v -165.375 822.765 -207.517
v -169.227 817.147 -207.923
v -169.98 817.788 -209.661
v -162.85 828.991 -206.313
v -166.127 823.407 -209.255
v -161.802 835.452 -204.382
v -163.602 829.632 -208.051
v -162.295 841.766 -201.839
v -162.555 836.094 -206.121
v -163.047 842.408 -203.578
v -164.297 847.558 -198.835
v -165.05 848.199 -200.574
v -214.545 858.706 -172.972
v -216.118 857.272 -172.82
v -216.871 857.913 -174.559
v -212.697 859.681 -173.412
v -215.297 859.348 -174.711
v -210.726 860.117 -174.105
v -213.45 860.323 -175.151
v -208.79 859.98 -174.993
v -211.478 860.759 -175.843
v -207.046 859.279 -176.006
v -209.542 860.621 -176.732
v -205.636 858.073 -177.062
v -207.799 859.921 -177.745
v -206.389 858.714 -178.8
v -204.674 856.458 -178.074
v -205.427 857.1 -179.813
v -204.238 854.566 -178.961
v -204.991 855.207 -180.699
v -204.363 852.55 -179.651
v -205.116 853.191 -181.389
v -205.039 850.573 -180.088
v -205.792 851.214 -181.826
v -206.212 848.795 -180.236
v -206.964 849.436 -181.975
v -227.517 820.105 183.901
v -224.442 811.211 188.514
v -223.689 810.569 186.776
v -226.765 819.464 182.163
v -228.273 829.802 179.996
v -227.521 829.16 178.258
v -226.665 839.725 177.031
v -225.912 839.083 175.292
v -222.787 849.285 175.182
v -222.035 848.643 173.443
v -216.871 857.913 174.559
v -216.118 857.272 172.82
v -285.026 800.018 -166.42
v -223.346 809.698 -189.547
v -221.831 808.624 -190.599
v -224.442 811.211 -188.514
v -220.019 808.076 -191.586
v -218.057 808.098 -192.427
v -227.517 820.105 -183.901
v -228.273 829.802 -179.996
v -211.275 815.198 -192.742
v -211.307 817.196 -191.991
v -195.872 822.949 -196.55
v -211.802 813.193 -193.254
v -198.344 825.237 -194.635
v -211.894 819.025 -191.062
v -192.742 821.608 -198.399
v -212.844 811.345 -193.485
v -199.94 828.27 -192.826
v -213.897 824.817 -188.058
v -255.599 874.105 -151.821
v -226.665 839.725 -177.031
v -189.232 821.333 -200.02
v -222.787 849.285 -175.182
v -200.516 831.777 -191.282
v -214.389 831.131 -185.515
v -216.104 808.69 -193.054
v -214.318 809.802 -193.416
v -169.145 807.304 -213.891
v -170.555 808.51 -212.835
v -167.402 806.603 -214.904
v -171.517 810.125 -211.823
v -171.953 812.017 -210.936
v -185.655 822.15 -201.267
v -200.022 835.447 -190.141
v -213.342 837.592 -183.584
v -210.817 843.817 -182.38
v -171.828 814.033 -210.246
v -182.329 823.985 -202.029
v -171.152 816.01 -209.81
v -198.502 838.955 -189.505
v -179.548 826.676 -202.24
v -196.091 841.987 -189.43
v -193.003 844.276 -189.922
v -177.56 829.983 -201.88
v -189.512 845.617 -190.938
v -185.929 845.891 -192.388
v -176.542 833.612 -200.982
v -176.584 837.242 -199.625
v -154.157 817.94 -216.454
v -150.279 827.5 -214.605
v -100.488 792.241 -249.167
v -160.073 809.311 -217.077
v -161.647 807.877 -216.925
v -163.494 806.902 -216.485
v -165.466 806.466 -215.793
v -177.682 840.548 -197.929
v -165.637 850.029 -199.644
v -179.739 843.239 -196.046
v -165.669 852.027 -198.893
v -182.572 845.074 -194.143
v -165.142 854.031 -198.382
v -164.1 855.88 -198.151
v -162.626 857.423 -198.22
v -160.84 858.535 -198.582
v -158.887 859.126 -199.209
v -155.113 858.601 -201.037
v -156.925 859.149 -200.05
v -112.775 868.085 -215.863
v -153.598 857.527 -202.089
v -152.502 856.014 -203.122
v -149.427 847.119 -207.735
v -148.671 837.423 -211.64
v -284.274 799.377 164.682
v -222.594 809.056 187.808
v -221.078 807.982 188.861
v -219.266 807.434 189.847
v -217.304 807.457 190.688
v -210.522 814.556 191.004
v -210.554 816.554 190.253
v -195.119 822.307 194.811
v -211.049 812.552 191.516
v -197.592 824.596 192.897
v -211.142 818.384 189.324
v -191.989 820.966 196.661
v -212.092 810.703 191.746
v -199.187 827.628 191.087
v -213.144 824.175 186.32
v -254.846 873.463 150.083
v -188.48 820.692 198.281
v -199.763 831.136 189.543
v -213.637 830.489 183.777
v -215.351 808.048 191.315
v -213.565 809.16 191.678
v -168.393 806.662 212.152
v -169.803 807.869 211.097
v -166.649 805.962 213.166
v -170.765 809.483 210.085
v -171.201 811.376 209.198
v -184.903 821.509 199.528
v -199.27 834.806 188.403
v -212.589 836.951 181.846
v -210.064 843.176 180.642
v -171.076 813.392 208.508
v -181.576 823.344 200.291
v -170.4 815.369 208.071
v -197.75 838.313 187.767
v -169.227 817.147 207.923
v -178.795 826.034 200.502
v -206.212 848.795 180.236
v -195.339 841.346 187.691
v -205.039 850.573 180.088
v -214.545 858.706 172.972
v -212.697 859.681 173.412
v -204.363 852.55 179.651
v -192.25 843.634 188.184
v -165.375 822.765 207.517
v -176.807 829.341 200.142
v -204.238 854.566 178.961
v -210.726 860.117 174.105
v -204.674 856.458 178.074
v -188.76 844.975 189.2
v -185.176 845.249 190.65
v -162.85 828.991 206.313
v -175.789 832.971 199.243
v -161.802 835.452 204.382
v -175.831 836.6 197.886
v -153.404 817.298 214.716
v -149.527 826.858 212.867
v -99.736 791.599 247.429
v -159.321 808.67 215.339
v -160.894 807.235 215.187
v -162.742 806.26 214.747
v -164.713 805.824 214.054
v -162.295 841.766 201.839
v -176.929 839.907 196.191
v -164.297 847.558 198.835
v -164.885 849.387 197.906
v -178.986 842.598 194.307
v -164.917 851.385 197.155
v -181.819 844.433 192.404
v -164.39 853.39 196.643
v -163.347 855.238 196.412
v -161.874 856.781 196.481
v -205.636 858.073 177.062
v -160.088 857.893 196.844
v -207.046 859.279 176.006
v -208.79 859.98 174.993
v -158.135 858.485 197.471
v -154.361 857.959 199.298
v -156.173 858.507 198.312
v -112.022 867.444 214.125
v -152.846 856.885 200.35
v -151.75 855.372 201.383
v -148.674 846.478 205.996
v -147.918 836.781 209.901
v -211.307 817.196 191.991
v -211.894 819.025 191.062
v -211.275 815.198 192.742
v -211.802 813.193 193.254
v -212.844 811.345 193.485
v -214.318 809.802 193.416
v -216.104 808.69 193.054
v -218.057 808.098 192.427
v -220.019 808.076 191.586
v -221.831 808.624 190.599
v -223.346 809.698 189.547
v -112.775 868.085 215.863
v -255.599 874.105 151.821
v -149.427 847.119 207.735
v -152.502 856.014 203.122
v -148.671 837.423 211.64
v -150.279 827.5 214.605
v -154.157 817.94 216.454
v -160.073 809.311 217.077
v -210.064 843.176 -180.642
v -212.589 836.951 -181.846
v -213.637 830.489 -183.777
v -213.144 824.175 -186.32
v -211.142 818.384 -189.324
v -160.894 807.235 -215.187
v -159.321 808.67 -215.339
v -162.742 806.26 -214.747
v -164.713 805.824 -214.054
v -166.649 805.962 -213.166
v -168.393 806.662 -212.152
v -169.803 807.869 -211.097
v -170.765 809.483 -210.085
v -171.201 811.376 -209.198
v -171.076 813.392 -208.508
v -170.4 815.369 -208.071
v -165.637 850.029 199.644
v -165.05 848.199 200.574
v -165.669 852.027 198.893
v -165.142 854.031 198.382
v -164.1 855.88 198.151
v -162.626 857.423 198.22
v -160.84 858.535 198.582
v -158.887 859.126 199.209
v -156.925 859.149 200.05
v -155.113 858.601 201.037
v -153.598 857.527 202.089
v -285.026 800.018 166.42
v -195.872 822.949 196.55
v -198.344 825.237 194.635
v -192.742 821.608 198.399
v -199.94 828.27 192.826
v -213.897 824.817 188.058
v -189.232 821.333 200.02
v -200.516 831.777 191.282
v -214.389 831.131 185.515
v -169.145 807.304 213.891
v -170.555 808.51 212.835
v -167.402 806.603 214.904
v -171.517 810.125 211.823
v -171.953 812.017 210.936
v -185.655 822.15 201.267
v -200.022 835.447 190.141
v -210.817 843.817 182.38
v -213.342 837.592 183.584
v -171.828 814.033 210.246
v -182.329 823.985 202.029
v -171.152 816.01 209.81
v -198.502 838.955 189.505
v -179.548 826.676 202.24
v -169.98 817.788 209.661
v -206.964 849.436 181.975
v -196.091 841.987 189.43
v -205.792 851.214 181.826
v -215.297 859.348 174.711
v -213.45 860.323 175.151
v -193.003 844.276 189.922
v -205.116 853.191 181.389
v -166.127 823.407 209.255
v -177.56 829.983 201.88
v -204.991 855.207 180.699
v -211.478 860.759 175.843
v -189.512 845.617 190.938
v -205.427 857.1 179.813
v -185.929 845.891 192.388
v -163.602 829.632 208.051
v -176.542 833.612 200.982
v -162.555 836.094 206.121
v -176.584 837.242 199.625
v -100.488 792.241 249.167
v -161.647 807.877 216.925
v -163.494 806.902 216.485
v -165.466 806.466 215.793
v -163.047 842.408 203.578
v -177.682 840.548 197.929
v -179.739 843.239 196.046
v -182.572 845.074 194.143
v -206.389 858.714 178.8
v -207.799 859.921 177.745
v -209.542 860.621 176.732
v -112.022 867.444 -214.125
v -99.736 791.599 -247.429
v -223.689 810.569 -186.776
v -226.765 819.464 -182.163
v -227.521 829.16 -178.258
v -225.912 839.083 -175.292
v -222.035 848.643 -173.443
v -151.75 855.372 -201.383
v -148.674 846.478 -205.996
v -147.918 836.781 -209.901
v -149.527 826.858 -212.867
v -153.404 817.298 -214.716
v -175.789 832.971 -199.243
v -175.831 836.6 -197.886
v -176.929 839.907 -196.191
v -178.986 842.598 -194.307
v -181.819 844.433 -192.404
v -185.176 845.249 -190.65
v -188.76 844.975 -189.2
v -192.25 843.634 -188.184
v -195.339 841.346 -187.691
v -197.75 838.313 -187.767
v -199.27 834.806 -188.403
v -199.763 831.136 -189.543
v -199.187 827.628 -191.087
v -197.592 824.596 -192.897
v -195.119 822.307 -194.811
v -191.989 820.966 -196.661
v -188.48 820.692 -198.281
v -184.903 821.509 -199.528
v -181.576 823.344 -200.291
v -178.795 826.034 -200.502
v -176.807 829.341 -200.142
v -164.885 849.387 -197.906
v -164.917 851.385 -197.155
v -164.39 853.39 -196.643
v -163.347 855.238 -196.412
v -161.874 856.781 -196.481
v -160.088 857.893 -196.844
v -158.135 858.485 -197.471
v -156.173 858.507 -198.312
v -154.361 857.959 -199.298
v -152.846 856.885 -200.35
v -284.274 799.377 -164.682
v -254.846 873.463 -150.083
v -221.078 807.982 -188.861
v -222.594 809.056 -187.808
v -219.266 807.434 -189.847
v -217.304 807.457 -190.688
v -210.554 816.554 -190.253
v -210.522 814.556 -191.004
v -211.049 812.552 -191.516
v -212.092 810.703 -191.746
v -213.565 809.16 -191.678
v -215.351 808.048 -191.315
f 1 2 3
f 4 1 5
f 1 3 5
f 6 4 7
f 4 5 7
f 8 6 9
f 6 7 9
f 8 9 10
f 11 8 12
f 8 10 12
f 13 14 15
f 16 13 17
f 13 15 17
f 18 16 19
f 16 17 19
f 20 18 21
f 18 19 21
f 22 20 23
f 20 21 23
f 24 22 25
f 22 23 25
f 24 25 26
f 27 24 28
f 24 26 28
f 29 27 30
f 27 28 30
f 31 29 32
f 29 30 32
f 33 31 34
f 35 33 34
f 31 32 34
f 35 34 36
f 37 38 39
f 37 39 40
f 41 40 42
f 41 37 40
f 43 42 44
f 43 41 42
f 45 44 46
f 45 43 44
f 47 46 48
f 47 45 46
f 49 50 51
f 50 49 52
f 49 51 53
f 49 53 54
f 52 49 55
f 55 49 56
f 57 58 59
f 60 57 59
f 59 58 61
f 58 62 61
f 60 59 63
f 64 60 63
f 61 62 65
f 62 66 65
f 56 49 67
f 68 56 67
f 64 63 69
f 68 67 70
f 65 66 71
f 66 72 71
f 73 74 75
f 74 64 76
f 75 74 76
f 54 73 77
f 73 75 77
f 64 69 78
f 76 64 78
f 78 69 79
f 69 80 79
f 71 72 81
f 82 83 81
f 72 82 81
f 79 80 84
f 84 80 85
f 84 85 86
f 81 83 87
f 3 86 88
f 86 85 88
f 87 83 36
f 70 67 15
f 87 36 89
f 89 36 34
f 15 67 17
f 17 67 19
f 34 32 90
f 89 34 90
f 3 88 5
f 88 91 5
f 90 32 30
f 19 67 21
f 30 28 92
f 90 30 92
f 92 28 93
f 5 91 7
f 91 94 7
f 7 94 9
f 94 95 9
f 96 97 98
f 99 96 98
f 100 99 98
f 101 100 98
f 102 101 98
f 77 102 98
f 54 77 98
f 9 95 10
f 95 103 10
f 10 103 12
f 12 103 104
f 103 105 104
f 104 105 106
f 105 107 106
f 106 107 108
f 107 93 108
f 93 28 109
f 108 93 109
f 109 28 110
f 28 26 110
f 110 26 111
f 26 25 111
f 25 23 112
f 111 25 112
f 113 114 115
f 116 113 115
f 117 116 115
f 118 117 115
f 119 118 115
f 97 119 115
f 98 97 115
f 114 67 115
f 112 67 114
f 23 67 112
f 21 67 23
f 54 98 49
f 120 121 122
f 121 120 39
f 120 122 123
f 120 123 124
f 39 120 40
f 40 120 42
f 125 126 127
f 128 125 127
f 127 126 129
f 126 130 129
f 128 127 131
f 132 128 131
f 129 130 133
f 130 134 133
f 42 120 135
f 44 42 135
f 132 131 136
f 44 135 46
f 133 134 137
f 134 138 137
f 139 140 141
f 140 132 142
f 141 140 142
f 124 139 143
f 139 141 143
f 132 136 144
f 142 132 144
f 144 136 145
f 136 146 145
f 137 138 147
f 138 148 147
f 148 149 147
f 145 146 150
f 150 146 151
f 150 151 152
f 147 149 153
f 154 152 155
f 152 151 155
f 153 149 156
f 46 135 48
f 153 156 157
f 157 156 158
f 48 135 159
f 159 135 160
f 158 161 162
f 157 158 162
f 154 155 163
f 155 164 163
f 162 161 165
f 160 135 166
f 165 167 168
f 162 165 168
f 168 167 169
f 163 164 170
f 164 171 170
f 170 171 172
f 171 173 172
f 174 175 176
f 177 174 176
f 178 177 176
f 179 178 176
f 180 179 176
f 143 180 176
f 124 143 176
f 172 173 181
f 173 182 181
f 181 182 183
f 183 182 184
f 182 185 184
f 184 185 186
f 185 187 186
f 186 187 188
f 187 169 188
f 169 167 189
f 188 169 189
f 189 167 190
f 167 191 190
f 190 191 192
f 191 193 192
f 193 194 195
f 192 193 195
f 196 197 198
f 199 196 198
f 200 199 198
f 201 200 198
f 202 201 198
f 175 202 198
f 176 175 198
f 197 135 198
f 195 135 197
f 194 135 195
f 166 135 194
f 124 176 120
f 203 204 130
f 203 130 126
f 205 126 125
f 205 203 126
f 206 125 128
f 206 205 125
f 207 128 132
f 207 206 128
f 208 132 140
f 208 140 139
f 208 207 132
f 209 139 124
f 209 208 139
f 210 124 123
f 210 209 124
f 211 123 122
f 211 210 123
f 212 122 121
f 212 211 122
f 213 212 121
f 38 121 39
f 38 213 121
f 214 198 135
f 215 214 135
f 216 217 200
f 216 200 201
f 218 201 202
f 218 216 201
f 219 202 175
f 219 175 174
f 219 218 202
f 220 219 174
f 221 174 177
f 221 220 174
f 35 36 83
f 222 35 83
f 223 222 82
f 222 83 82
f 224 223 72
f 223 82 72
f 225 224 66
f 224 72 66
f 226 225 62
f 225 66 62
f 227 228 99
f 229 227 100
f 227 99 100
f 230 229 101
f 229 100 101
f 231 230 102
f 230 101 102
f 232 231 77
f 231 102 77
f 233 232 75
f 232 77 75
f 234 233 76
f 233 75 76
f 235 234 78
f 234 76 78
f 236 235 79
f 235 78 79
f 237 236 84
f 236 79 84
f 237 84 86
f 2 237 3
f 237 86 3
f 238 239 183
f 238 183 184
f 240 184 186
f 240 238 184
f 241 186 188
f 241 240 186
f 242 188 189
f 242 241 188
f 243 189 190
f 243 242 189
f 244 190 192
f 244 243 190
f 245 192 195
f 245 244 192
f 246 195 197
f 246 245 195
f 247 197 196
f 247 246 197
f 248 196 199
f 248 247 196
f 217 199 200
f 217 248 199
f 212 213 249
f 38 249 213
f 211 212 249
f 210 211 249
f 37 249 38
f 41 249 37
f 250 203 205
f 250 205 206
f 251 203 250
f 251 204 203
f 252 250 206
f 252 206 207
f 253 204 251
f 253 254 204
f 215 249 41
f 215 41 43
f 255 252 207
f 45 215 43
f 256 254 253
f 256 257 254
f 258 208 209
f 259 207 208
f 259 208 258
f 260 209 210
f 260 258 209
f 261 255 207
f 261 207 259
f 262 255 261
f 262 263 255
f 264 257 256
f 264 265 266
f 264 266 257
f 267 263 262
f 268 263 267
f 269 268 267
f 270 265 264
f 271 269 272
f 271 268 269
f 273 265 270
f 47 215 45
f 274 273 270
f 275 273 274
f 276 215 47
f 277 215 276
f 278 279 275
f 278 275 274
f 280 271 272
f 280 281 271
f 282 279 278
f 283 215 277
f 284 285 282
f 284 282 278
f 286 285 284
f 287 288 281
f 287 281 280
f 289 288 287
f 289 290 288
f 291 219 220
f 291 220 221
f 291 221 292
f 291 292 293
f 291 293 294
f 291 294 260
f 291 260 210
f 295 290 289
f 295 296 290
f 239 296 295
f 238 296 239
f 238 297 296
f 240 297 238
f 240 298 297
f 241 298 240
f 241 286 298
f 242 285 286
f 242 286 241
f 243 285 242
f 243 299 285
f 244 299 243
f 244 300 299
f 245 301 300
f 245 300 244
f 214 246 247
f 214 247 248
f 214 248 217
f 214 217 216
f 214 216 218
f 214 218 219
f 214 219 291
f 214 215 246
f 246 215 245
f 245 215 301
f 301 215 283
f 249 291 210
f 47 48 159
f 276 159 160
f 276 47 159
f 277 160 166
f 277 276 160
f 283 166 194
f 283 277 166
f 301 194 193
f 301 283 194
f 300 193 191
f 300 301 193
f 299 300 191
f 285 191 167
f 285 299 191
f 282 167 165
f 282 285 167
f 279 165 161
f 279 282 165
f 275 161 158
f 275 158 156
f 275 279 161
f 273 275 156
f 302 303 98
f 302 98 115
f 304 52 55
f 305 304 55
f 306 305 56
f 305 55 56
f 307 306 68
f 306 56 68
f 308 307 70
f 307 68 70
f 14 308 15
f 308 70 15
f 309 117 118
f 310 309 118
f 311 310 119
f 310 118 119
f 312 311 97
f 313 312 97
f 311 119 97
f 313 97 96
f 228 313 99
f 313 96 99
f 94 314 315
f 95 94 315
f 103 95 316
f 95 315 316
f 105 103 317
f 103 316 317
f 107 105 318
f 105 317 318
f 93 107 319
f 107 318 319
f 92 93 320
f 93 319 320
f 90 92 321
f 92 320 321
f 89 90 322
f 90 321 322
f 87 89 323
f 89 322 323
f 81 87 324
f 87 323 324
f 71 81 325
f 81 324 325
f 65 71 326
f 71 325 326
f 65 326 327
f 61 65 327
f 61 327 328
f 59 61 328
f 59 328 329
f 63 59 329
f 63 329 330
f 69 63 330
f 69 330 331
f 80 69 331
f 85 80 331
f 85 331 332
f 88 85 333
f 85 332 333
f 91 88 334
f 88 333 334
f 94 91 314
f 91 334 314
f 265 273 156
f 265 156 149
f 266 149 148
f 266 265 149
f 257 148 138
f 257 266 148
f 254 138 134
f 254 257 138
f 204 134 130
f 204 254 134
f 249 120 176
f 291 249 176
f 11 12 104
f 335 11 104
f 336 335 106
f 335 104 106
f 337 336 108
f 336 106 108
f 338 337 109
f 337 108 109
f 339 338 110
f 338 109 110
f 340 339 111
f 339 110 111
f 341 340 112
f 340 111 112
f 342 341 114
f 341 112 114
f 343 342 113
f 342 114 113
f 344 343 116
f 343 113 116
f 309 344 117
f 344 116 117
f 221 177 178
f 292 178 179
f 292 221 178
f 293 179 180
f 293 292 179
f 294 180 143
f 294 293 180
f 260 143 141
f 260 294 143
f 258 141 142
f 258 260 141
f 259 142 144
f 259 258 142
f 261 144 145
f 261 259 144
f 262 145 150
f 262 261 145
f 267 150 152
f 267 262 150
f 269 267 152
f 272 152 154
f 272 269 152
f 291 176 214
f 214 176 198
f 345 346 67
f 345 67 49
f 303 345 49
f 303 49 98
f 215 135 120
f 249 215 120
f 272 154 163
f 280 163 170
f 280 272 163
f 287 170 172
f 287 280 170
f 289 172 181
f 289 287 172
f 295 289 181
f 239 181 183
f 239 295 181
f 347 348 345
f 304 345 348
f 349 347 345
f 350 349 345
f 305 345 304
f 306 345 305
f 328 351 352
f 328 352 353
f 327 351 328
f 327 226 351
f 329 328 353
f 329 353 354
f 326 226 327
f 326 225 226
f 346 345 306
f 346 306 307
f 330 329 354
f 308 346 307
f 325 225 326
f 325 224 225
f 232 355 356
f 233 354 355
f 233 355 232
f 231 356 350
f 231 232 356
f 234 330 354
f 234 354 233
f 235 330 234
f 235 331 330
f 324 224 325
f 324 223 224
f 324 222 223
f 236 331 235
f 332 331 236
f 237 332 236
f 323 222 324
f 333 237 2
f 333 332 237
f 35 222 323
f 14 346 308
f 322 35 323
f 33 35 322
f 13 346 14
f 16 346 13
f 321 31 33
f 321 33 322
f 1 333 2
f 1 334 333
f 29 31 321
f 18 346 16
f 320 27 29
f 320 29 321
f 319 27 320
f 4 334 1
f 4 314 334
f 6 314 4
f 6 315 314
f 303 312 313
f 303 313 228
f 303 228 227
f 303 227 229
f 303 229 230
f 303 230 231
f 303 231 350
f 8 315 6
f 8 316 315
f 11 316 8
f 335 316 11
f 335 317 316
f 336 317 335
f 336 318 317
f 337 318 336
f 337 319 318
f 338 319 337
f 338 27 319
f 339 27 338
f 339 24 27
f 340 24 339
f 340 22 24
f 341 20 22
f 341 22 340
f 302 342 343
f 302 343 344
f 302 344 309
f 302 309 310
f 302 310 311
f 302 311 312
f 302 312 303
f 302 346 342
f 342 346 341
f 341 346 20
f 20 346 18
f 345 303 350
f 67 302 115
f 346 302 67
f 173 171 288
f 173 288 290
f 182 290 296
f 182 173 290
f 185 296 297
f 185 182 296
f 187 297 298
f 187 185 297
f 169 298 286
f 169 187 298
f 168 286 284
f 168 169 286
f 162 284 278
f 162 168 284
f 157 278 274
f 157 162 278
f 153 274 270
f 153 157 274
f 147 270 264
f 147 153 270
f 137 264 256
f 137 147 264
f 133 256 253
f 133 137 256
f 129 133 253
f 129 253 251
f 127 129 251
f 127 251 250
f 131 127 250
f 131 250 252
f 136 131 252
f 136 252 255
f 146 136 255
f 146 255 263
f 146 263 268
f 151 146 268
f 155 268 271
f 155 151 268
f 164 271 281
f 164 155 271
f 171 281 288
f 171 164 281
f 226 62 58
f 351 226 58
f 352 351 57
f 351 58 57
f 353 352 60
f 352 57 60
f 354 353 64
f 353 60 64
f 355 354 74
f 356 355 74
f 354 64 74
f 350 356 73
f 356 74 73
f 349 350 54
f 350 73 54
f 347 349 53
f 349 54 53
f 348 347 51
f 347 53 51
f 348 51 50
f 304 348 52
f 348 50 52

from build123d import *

# Parameters (mm, degrees)
BOSS_EXTRUDE1_START = -12.7
SKETCH2_R           = 13
BOSS_EXTRUDE1_DEPTH = 2
CUT_EXTRUDE1_DEPTH  = 10


with BuildPart() as part:
    # Sketch2 → Boss-Extrude1 (new body)
    with BuildSketch(Plane(origin=(-185.788028835, 158.376979194, -429.22116108), x_dir=(0.9258065436497296, 0.16694116630884537, -0.33913550496340533), z_dir=(0.37624698781411564, -0.3207357424179442, 0.8692334483304326)).offset(BOSS_EXTRUDE1_START)):
        Polygon((113.718253634, 735.792476768), (-39.222903548, 769.633606999), (-73.884194412, 696.376966977), (123.726243288, 652.651911665), align=None)
        with Locations(Location((31.08434974, 713.613740602, 0), (0, 0, 349.848426749))):
            Circle(SKETCH2_R, mode=Mode.SUBTRACT)
    extrude(amount=-BOSS_EXTRUDE1_DEPTH)

    # Sketch3 → Cut-Extrude1 (cut)
    with BuildSketch(Plane(origin=(-191.318859556, 163.091794607, -441.998892771), x_dir=(-0.9258065436497296, -0.16694116630884515, 0.3391355049634055), z_dir=(-0.3762469878141158, 0.3207357424179439, -0.8692334483304328))):
        with BuildLine():
            ThreePointArc((-70.60215835, 730.564929432), (-73.178245929, 704.832857751), (-60.529143361, 682.276795496))
            ThreePointArc((-60.529143361, 682.276795496), (-49.927677304, 682.606821918), (-50.257703726, 693.208287975))
            ThreePointArc((-50.257703726, 693.208287975), (-58.494328654, 707.89595642), (-56.816876277, 724.651724026))
            ThreePointArc((-56.816876277, 724.651724026), (-60.75291461, 734.500967765), (-70.60215835, 730.564929432))
        make_face()
        with BuildLine():
            ThreePointArc((8.433458869, 696.662551773), (11.009546448, 722.394623454), (-1.639556119, 744.950685709))
            ThreePointArc((-1.639556119, 744.950685709), (-12.241022177, 744.620659287), (-11.910995755, 734.01919323))
            ThreePointArc((-11.910995755, 734.01919323), (-3.674370827, 719.331524785), (-5.351823204, 702.575757178))
            ThreePointArc((-5.351823204, 702.575757178), (-1.415784871, 692.726513439), (8.433458869, 696.662551773))
        make_face()
    extrude(amount=-CUT_EXTRUDE1_DEPTH, mode=Mode.SUBTRACT)


with BuildPart() as body_2:
    # Mirror1: mirrored copy
    add(part.part.mirror(Plane.XY))


solid = Compound([part.part, body_2.part])
